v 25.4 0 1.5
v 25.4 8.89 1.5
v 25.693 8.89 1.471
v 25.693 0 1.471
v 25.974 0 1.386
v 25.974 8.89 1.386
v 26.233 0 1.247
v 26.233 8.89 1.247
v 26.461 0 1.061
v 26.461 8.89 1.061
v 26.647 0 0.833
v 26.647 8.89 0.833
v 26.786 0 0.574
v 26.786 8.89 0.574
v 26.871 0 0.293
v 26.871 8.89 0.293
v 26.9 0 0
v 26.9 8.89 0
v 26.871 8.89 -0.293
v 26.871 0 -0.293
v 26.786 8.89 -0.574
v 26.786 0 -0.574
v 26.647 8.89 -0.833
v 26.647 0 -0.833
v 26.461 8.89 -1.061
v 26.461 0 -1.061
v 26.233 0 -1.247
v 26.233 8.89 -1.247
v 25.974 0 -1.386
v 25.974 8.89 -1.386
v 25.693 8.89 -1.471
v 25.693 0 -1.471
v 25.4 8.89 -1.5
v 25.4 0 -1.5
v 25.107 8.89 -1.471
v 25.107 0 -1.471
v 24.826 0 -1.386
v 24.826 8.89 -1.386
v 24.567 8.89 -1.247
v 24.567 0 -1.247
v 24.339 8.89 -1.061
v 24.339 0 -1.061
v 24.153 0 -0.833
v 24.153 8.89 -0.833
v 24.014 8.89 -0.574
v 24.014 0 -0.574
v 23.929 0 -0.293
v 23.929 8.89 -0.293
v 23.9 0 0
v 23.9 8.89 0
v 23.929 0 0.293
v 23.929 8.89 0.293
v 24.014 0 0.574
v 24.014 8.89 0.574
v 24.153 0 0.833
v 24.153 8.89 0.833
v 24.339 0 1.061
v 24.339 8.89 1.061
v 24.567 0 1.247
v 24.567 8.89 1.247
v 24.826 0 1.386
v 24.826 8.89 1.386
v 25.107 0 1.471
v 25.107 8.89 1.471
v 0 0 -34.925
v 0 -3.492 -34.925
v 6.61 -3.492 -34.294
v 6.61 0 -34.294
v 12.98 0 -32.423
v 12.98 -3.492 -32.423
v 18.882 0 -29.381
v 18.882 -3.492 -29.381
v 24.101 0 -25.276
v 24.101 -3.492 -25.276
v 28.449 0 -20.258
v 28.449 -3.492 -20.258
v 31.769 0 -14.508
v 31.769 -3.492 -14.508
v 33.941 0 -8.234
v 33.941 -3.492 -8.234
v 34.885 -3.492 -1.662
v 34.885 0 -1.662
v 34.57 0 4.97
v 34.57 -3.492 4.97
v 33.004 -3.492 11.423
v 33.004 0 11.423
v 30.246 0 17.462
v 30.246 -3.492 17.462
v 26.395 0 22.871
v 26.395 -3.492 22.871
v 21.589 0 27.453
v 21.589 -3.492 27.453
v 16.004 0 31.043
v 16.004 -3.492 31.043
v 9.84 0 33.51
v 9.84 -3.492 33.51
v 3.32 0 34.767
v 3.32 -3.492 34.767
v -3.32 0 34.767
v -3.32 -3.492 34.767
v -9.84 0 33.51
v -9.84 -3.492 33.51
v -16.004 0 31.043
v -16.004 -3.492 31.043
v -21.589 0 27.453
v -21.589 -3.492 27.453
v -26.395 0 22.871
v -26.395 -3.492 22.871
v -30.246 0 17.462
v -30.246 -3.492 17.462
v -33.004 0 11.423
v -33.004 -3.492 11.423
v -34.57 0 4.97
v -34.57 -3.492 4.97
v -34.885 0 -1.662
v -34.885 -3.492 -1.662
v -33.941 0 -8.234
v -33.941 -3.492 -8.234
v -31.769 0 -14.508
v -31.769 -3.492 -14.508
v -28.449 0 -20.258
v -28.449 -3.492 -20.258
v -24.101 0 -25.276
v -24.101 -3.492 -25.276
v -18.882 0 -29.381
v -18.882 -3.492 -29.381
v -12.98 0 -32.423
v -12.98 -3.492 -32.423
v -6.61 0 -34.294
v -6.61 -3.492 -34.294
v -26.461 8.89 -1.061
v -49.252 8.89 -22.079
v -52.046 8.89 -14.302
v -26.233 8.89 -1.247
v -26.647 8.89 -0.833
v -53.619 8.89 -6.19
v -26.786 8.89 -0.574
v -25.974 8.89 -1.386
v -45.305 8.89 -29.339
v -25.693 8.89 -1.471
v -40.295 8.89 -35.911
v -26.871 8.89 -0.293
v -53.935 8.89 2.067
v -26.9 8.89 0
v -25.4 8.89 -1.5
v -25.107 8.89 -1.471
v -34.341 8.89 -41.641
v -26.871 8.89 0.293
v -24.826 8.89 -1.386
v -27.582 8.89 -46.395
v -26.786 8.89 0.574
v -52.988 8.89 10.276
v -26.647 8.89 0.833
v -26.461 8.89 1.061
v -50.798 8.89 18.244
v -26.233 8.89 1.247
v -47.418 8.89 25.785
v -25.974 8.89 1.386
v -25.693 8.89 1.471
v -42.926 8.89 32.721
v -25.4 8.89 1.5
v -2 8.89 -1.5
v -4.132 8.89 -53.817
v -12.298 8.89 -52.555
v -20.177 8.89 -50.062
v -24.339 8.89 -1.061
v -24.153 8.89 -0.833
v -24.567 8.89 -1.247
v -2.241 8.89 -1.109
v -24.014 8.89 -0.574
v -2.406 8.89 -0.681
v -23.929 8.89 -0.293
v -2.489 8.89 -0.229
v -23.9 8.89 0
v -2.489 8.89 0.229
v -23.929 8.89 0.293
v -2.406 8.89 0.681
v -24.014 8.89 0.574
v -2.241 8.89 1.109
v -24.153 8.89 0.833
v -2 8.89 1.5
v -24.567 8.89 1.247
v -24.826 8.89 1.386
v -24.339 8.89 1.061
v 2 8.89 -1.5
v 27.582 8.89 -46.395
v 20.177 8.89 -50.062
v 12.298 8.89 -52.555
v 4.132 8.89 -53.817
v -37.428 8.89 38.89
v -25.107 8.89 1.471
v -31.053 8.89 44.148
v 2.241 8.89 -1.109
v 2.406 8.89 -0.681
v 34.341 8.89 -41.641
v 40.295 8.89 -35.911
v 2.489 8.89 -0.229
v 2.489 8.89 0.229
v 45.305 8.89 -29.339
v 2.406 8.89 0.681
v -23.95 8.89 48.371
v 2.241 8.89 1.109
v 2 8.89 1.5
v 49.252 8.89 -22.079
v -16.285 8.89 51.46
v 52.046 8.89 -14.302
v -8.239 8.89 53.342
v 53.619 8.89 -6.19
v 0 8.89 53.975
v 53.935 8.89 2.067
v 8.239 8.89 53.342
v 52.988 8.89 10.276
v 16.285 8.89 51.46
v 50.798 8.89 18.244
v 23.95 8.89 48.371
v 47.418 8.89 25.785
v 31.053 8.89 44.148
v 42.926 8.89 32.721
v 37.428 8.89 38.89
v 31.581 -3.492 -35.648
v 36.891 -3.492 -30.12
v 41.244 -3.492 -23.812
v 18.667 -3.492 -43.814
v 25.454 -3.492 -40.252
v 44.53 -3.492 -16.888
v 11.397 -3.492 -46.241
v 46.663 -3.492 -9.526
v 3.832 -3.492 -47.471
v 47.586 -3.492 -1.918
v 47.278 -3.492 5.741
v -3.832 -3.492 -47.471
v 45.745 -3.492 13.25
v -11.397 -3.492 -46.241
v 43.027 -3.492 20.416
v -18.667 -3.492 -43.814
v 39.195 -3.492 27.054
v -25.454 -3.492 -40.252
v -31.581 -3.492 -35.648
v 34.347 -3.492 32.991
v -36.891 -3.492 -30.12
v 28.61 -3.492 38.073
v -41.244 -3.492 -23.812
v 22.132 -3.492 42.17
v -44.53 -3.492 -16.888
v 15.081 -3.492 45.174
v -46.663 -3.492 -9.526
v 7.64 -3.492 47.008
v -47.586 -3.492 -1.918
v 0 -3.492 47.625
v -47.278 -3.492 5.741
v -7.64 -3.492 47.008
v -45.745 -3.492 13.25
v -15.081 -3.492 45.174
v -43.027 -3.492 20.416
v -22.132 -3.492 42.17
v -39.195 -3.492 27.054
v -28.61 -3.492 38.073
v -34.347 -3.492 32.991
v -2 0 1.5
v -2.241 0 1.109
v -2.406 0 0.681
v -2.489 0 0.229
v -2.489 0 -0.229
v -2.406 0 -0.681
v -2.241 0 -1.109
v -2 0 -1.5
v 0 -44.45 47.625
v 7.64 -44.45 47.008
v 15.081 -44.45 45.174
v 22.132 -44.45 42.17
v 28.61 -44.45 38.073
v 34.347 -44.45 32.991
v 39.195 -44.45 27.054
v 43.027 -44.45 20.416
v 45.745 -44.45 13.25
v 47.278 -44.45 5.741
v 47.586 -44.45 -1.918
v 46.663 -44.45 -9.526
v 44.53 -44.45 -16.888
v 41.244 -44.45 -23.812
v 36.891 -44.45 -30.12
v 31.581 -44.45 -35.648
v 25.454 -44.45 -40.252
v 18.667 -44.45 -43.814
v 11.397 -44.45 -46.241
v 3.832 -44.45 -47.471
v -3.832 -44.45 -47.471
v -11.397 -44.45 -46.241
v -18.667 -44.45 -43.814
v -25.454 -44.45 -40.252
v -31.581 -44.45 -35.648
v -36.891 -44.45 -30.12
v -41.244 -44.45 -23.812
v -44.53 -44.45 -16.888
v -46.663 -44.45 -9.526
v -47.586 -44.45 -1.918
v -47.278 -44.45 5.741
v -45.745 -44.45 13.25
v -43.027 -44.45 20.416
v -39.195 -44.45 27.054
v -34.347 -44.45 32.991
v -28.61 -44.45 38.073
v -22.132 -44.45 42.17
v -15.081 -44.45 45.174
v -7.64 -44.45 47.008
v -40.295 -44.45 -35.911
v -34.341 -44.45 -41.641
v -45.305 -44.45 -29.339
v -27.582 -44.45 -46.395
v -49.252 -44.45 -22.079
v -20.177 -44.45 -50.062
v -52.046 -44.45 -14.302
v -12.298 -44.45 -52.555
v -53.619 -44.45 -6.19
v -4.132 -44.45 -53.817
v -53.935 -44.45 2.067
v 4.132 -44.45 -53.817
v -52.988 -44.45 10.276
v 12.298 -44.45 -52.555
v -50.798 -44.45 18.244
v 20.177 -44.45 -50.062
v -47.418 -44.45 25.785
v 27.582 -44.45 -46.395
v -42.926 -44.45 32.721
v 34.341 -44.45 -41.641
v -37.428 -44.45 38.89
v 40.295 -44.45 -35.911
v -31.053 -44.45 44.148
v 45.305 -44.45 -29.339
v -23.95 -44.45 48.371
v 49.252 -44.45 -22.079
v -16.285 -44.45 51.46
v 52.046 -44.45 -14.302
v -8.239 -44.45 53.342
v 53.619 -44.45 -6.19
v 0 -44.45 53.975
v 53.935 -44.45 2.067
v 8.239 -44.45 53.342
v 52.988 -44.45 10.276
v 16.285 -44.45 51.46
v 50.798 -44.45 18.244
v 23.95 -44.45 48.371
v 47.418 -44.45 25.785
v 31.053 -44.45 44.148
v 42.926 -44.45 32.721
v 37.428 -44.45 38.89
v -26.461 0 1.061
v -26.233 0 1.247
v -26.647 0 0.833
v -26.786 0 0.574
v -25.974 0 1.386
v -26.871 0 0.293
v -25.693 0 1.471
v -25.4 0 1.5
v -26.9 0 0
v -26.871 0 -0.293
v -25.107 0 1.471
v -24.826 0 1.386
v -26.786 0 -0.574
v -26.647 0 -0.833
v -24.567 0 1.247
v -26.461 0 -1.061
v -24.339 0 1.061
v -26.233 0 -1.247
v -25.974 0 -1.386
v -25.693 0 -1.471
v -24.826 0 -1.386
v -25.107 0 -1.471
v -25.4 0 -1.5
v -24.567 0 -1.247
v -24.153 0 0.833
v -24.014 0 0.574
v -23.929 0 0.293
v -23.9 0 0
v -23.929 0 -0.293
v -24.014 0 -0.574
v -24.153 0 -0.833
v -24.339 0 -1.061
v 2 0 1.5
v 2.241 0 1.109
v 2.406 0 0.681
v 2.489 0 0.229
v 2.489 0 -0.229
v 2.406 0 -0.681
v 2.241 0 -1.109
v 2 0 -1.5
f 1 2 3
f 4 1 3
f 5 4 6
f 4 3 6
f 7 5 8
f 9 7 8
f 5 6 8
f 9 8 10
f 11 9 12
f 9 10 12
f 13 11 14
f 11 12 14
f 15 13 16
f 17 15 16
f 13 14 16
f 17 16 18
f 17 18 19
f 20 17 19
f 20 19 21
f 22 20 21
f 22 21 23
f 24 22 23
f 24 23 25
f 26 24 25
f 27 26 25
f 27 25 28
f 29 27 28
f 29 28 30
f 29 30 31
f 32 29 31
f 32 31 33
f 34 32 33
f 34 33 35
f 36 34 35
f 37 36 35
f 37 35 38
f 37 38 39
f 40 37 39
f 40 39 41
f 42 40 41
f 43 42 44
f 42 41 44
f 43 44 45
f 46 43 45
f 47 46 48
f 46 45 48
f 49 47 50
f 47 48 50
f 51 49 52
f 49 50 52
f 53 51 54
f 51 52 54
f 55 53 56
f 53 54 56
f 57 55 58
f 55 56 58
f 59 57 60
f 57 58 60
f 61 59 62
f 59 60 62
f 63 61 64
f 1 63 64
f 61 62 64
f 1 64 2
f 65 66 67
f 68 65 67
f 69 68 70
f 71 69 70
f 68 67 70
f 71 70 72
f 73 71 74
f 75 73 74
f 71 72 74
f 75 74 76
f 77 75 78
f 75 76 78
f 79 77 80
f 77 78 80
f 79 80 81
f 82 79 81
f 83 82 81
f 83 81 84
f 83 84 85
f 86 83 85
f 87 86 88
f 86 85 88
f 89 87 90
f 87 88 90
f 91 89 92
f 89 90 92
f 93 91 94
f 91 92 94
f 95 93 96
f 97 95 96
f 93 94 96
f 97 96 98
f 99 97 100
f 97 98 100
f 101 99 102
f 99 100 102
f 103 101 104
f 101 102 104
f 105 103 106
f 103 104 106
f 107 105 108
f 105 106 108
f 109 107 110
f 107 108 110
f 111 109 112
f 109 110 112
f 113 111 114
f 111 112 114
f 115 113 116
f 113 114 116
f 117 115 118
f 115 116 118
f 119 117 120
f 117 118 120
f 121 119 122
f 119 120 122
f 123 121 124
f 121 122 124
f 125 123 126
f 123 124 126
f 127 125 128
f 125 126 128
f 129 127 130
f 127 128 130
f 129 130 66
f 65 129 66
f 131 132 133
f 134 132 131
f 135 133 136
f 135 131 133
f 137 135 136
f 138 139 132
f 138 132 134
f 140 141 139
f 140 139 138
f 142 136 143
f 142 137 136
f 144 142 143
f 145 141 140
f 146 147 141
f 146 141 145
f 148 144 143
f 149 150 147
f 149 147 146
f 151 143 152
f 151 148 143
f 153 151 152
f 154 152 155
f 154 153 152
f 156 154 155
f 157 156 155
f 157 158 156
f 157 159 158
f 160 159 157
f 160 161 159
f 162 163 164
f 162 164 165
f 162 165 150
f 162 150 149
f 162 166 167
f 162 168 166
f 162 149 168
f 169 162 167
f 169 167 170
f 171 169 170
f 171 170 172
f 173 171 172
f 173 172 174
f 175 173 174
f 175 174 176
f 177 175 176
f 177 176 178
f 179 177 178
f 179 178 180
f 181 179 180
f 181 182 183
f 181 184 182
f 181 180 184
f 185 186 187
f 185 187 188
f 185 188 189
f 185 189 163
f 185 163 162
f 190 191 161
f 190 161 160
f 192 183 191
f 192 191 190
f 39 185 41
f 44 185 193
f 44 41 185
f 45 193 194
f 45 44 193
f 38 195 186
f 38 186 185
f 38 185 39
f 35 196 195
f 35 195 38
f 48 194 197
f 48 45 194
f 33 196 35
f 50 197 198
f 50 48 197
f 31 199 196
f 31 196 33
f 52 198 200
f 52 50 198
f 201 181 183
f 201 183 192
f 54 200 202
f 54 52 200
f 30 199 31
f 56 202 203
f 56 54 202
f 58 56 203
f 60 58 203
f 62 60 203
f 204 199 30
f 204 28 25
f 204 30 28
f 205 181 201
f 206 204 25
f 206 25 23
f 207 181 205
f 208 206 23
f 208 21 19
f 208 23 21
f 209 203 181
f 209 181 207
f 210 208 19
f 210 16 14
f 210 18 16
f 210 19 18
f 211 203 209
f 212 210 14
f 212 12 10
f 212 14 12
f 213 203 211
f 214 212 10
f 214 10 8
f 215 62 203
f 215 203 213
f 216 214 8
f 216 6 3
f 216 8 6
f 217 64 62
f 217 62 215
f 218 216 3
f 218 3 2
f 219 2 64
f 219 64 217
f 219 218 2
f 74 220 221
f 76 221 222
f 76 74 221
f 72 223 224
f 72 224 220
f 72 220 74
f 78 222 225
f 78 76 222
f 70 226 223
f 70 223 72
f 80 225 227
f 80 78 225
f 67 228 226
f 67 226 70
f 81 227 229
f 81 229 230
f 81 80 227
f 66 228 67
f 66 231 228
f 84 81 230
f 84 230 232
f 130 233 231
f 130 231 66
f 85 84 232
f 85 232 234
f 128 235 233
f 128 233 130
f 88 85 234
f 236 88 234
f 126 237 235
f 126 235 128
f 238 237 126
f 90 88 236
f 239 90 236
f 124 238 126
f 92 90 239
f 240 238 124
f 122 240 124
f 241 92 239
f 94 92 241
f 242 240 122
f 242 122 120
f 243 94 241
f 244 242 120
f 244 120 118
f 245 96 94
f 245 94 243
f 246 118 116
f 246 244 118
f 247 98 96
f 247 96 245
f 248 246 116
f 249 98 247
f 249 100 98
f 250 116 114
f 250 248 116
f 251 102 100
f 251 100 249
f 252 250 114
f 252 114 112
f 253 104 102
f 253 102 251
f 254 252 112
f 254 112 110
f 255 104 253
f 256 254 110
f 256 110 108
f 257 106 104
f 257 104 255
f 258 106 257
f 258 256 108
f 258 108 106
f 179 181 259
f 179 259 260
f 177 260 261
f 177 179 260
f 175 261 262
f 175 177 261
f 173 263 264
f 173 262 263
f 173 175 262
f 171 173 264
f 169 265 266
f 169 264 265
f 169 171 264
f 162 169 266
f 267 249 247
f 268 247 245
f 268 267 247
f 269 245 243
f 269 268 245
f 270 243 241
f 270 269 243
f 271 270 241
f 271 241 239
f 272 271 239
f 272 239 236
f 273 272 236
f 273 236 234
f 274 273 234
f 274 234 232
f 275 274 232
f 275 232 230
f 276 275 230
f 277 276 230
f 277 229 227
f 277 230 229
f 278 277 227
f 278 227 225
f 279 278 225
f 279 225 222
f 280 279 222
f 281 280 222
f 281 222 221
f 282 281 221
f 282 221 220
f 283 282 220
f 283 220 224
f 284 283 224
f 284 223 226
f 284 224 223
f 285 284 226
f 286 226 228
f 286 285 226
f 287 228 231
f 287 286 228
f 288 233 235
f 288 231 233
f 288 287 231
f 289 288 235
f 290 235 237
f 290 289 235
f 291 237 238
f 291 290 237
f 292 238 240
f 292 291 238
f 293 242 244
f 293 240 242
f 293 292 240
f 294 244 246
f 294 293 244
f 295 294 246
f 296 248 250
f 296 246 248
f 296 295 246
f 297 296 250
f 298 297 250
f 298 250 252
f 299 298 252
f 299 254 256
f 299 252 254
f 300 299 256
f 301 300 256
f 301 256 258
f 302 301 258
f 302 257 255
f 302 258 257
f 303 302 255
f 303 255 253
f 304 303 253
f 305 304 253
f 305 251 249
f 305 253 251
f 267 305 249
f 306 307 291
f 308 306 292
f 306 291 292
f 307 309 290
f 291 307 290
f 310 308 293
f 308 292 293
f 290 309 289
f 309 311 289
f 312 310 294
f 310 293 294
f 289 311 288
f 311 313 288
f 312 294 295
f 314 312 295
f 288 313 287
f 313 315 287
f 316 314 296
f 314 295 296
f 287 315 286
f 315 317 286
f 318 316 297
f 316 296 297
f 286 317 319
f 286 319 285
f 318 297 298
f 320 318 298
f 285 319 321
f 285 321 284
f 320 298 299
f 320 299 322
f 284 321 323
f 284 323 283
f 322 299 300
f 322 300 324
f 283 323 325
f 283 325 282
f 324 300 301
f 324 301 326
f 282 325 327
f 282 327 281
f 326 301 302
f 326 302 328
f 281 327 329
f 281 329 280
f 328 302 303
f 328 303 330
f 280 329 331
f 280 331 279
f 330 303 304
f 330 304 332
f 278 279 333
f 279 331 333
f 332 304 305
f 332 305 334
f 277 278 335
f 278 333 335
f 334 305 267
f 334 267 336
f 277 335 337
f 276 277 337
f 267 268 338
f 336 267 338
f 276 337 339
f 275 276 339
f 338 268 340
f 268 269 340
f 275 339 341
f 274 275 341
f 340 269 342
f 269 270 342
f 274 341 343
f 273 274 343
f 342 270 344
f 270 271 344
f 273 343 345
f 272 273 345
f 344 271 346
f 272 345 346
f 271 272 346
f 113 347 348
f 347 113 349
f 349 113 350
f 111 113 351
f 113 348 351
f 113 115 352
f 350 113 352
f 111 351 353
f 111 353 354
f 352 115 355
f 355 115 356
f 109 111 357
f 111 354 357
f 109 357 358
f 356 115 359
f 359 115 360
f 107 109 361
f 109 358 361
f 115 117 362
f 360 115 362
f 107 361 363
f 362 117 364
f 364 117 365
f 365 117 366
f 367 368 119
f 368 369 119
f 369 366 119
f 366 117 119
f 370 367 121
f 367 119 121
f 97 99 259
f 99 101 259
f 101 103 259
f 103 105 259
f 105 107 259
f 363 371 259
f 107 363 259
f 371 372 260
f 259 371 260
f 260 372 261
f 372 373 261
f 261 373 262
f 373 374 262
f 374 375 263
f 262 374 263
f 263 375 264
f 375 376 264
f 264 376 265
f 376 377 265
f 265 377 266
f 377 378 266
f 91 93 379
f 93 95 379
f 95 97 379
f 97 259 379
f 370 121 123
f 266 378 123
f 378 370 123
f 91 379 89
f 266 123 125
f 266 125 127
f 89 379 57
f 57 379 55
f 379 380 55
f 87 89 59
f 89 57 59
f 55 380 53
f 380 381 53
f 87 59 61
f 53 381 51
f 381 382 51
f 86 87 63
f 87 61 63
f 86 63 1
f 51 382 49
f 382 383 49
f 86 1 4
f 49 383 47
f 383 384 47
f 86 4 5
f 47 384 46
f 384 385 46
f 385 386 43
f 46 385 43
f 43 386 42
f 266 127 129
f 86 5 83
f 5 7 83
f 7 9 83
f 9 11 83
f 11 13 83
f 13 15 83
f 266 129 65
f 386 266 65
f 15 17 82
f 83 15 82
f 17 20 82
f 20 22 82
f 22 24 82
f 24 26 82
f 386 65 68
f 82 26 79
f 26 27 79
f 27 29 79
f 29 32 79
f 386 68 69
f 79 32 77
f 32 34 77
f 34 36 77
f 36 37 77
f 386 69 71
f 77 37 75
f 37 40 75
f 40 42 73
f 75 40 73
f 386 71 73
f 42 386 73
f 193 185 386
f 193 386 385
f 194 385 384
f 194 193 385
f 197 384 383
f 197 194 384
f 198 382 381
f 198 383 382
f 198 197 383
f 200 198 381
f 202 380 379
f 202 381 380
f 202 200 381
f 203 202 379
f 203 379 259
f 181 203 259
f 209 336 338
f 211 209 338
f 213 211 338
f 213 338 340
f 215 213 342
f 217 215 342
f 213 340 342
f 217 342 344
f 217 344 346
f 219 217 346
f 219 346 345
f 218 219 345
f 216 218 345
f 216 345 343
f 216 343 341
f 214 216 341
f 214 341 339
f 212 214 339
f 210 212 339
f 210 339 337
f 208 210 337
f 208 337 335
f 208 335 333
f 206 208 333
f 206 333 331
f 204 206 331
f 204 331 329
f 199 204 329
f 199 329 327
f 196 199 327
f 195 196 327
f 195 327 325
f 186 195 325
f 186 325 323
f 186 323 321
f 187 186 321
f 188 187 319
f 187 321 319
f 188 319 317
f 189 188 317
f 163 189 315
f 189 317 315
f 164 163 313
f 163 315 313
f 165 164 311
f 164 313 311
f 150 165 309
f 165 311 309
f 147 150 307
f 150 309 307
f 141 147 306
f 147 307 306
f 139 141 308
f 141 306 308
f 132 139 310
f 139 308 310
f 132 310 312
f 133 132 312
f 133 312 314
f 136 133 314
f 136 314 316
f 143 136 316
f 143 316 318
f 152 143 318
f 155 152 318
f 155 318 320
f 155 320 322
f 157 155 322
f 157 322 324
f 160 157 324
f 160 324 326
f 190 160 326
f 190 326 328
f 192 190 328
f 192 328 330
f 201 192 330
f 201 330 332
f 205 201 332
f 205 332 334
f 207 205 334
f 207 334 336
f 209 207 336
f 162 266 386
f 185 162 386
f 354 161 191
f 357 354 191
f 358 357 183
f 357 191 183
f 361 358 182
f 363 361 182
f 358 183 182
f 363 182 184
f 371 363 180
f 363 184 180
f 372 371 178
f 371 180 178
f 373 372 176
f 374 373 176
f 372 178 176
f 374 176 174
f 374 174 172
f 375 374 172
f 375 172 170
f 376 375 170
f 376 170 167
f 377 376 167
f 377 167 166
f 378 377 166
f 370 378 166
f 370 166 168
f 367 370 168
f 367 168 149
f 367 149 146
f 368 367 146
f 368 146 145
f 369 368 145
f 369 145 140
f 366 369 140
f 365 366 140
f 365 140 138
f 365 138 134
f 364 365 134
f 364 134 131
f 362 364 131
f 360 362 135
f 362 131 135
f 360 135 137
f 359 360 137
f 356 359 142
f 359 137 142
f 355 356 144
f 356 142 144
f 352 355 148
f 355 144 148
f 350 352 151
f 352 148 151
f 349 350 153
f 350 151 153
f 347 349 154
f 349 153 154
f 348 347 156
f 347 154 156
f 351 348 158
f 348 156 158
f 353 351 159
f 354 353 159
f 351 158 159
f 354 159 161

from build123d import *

# Parameters (mm, degrees)
SKETCH1_R           = 53.975
BOSS_EXTRUDE1_DEPTH = 8.89
BOSS_EXTRUDE2_START = -44.45
SKETCH1_4_R         = 53.975
SKETCH1_4_R_2       = 47.625
BOSS_EXTRUDE2_DEPTH = 44.45
CUT_EXTRUDE1_DEPTH  = 25.4
BOSS_EXTRUDE3_START = 3.4925
SKETCH3_R           = 47.625
SKETCH3_R_2         = 34.925
BOSS_EXTRUDE3_DEPTH = 3.4925
SKETCH4_R           = 1.5
CUT_EXTRUDE2_DEPTH  = 21.2725


with BuildPart() as part:
    # Sketch1 → Boss-Extrude1 (new body)
    with BuildSketch(Plane(origin=(0, 0, 0), x_dir=(1, 0, 0), z_dir=(0, 1, 0))):
        Circle(SKETCH1_R)
    extrude(amount=BOSS_EXTRUDE1_DEPTH)

    # Sketch1<4> → Boss-Extrude2 (add)
    with BuildSketch(Plane(origin=(0, 0, 0), x_dir=(1, 0, 0), z_dir=(0, 1, 0)).offset(BOSS_EXTRUDE2_START)):
        Circle(SKETCH1_4_R)
        Circle(SKETCH1_4_R_2, mode=Mode.SUBTRACT)
    extrude(amount=BOSS_EXTRUDE2_DEPTH)

    # Sketch2 → Cut-Extrude1 (cut)
    with BuildSketch(Plane(origin=(0, 8.89, 0), x_dir=(1, 0, 0), z_dir=(0, 1, 0))):
        with BuildLine():
            Line((-2, 1.5), (2, 1.5))
            ThreePointArc((2, 1.5), (2.5, 0), (2, -1.5))
            Line((2, -1.5), (-2, -1.5))
            ThreePointArc((-2, -1.5), (-2.5, 0), (-2, 1.5))
        make_face()
    extrude(amount=-CUT_EXTRUDE1_DEPTH, mode=Mode.SUBTRACT)

    # Sketch3 → Boss-Extrude3 (add)
    with BuildSketch(Plane.XZ.offset(BOSS_EXTRUDE3_START)):
        Circle(SKETCH3_R)
        Circle(SKETCH3_R_2, mode=Mode.SUBTRACT)
    extrude(amount=-BOSS_EXTRUDE3_DEPTH)

    # Sketch4 → Cut-Extrude2 (cut)
    with BuildSketch(Plane(origin=(0, 8.89, 0), x_dir=(1, 0, 0), z_dir=(0, 1, 0))):
        with Locations((25.4, 0)):
            Circle(SKETCH4_R)
        with Locations((-25.4, 0)):
            Circle(SKETCH4_R)
    extrude(amount=-CUT_EXTRUDE2_DEPTH, mode=Mode.SUBTRACT)


solid = part.part
